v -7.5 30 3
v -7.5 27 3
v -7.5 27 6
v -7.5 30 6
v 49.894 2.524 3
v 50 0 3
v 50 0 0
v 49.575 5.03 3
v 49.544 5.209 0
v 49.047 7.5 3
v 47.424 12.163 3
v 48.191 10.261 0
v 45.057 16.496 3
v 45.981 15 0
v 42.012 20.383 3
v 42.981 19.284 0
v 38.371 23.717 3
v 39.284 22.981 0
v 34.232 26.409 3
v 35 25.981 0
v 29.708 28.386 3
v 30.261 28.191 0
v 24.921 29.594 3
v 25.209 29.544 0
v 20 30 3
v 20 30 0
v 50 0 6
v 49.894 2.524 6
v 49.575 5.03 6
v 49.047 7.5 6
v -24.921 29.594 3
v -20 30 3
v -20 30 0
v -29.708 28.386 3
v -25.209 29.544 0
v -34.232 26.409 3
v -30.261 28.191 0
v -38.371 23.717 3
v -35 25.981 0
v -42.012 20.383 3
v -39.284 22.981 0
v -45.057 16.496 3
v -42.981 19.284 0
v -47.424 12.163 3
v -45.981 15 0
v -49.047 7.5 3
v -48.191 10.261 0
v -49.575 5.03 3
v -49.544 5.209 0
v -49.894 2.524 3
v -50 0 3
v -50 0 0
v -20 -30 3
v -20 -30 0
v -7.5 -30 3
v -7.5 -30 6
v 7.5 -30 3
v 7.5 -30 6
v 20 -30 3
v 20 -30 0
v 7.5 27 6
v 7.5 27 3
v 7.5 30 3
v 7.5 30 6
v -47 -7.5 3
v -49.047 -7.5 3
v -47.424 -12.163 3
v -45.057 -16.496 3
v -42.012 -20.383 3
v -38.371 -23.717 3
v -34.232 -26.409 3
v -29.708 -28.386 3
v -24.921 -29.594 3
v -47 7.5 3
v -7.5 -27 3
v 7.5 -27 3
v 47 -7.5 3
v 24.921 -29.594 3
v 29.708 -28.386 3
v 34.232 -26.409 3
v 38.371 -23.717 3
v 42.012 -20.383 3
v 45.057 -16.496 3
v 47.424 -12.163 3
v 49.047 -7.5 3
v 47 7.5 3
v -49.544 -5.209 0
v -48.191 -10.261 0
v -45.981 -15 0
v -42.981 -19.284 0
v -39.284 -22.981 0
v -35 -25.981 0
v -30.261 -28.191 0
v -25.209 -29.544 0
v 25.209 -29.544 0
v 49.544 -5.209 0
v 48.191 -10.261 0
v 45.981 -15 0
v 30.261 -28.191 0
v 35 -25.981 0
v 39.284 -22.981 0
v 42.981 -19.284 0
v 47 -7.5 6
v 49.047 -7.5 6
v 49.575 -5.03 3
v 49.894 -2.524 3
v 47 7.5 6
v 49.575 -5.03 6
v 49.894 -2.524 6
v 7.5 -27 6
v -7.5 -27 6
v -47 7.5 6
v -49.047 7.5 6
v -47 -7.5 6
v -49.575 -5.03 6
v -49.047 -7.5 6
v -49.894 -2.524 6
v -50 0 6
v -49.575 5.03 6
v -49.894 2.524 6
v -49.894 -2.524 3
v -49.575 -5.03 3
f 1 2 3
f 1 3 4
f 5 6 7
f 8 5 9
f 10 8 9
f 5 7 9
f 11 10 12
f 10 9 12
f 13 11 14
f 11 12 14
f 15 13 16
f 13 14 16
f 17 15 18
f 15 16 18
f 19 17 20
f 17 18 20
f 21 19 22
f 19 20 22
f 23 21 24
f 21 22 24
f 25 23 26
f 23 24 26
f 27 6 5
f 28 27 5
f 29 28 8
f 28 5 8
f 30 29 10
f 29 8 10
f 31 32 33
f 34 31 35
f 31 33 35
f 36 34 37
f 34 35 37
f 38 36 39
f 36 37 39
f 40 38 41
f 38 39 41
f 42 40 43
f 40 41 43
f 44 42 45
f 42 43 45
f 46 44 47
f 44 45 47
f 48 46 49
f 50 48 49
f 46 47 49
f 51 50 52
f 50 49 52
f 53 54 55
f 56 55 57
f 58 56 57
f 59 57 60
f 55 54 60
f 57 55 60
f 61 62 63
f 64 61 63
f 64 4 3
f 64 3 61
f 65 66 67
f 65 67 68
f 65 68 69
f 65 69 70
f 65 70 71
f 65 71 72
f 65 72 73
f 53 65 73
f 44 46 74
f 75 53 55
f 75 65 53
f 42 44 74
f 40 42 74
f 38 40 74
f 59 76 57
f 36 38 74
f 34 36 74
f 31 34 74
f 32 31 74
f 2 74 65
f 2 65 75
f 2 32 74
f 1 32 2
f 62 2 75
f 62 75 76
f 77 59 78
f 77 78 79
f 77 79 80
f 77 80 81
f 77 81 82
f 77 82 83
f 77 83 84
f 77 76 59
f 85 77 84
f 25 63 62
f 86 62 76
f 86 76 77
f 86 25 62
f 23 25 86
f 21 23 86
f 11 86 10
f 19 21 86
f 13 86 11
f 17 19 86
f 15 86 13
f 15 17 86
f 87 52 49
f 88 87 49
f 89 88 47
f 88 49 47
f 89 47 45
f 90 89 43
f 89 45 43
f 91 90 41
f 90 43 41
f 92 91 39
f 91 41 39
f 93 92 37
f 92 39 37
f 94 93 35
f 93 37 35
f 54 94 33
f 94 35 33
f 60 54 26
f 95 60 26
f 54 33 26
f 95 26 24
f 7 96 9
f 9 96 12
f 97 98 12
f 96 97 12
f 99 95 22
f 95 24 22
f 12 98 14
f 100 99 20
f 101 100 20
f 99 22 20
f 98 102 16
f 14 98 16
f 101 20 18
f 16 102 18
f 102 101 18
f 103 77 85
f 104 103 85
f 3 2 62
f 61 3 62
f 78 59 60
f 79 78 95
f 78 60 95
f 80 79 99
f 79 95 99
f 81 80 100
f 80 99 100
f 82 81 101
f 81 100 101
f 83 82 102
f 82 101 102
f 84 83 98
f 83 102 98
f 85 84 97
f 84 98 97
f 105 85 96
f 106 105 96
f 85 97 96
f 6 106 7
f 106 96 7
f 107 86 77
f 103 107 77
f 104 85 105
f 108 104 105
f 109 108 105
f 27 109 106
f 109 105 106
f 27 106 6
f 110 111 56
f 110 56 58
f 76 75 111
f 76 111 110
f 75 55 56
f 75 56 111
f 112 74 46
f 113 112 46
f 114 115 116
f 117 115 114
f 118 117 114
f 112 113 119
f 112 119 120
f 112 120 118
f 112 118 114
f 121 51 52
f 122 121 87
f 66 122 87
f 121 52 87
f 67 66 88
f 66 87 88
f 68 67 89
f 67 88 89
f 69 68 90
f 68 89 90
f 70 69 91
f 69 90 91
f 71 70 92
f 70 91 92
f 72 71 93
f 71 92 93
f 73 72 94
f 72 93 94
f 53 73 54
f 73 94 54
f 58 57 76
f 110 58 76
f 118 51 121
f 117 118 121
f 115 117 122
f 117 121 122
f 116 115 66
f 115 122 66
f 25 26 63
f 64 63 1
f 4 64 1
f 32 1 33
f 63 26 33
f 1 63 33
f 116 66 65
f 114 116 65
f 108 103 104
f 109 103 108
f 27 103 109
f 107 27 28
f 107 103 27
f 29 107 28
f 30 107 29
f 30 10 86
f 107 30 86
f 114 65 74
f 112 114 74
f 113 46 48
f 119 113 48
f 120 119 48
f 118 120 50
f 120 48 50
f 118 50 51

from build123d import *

# Parameters (mm, degrees)
F1_DEPTH = 3
F2_W     = 15
F2_H     = 3
F3_DEPTH = 3


with BuildPart() as f1:
    # F0 (on Top) → F1 (new body)
    with BuildSketch(Plane.XY):
        with BuildLine():
            Line((20, 30), (-20, 30))
            ThreePointArc((-20, 30), (-41.213203, 21.213203), (-50, 0))
            ThreePointArc((-50, 0), (-41.213203, -21.213203), (-20, -30))
            Line((-20, -30), (20, -30))
            ThreePointArc((20, -30), (41.213203, -21.213203), (50, 0))
            ThreePointArc((50, 0), (41.213203, 21.213203), (20, 30))
        make_face()
    extrude(amount=F1_DEPTH)

    # F2 (on face) → F3 (join)
    with BuildSketch(Plane.XY.offset(3)):
        with Locations((0, 28.5)):
            Rectangle(F2_W, F2_H)
        with BuildLine():
            Line((-47, 7.5), (-49.047375, 7.5))
            ThreePointArc((-49.047375, 7.5), (-49.760891, 3.780129), (-50, 0))
            ThreePointArc((-50, 0), (-49.760891, -3.780129), (-49.047375, -7.5))
            Line((-49.047375, -7.5), (-47, -7.5))
            Line((-47, -7.5), (-47, 7.5))
        make_face()
        with Locations((0, -28.5)):
            Rectangle(F2_W, F2_H)
        with BuildLine():
            ThreePointArc((50, 0), (49.760891, 3.780129), (49.047375, 7.5))
            Line((49.047375, 7.5), (47, 7.5))
            Line((47, 7.5), (47, -7.5))
            Line((47, -7.5), (49.047375, -7.5))
            ThreePointArc((49.047375, -7.5), (49.760891, -3.780129), (50, 0))
        make_face()
    extrude(amount=F3_DEPTH)


solid = f1.part
